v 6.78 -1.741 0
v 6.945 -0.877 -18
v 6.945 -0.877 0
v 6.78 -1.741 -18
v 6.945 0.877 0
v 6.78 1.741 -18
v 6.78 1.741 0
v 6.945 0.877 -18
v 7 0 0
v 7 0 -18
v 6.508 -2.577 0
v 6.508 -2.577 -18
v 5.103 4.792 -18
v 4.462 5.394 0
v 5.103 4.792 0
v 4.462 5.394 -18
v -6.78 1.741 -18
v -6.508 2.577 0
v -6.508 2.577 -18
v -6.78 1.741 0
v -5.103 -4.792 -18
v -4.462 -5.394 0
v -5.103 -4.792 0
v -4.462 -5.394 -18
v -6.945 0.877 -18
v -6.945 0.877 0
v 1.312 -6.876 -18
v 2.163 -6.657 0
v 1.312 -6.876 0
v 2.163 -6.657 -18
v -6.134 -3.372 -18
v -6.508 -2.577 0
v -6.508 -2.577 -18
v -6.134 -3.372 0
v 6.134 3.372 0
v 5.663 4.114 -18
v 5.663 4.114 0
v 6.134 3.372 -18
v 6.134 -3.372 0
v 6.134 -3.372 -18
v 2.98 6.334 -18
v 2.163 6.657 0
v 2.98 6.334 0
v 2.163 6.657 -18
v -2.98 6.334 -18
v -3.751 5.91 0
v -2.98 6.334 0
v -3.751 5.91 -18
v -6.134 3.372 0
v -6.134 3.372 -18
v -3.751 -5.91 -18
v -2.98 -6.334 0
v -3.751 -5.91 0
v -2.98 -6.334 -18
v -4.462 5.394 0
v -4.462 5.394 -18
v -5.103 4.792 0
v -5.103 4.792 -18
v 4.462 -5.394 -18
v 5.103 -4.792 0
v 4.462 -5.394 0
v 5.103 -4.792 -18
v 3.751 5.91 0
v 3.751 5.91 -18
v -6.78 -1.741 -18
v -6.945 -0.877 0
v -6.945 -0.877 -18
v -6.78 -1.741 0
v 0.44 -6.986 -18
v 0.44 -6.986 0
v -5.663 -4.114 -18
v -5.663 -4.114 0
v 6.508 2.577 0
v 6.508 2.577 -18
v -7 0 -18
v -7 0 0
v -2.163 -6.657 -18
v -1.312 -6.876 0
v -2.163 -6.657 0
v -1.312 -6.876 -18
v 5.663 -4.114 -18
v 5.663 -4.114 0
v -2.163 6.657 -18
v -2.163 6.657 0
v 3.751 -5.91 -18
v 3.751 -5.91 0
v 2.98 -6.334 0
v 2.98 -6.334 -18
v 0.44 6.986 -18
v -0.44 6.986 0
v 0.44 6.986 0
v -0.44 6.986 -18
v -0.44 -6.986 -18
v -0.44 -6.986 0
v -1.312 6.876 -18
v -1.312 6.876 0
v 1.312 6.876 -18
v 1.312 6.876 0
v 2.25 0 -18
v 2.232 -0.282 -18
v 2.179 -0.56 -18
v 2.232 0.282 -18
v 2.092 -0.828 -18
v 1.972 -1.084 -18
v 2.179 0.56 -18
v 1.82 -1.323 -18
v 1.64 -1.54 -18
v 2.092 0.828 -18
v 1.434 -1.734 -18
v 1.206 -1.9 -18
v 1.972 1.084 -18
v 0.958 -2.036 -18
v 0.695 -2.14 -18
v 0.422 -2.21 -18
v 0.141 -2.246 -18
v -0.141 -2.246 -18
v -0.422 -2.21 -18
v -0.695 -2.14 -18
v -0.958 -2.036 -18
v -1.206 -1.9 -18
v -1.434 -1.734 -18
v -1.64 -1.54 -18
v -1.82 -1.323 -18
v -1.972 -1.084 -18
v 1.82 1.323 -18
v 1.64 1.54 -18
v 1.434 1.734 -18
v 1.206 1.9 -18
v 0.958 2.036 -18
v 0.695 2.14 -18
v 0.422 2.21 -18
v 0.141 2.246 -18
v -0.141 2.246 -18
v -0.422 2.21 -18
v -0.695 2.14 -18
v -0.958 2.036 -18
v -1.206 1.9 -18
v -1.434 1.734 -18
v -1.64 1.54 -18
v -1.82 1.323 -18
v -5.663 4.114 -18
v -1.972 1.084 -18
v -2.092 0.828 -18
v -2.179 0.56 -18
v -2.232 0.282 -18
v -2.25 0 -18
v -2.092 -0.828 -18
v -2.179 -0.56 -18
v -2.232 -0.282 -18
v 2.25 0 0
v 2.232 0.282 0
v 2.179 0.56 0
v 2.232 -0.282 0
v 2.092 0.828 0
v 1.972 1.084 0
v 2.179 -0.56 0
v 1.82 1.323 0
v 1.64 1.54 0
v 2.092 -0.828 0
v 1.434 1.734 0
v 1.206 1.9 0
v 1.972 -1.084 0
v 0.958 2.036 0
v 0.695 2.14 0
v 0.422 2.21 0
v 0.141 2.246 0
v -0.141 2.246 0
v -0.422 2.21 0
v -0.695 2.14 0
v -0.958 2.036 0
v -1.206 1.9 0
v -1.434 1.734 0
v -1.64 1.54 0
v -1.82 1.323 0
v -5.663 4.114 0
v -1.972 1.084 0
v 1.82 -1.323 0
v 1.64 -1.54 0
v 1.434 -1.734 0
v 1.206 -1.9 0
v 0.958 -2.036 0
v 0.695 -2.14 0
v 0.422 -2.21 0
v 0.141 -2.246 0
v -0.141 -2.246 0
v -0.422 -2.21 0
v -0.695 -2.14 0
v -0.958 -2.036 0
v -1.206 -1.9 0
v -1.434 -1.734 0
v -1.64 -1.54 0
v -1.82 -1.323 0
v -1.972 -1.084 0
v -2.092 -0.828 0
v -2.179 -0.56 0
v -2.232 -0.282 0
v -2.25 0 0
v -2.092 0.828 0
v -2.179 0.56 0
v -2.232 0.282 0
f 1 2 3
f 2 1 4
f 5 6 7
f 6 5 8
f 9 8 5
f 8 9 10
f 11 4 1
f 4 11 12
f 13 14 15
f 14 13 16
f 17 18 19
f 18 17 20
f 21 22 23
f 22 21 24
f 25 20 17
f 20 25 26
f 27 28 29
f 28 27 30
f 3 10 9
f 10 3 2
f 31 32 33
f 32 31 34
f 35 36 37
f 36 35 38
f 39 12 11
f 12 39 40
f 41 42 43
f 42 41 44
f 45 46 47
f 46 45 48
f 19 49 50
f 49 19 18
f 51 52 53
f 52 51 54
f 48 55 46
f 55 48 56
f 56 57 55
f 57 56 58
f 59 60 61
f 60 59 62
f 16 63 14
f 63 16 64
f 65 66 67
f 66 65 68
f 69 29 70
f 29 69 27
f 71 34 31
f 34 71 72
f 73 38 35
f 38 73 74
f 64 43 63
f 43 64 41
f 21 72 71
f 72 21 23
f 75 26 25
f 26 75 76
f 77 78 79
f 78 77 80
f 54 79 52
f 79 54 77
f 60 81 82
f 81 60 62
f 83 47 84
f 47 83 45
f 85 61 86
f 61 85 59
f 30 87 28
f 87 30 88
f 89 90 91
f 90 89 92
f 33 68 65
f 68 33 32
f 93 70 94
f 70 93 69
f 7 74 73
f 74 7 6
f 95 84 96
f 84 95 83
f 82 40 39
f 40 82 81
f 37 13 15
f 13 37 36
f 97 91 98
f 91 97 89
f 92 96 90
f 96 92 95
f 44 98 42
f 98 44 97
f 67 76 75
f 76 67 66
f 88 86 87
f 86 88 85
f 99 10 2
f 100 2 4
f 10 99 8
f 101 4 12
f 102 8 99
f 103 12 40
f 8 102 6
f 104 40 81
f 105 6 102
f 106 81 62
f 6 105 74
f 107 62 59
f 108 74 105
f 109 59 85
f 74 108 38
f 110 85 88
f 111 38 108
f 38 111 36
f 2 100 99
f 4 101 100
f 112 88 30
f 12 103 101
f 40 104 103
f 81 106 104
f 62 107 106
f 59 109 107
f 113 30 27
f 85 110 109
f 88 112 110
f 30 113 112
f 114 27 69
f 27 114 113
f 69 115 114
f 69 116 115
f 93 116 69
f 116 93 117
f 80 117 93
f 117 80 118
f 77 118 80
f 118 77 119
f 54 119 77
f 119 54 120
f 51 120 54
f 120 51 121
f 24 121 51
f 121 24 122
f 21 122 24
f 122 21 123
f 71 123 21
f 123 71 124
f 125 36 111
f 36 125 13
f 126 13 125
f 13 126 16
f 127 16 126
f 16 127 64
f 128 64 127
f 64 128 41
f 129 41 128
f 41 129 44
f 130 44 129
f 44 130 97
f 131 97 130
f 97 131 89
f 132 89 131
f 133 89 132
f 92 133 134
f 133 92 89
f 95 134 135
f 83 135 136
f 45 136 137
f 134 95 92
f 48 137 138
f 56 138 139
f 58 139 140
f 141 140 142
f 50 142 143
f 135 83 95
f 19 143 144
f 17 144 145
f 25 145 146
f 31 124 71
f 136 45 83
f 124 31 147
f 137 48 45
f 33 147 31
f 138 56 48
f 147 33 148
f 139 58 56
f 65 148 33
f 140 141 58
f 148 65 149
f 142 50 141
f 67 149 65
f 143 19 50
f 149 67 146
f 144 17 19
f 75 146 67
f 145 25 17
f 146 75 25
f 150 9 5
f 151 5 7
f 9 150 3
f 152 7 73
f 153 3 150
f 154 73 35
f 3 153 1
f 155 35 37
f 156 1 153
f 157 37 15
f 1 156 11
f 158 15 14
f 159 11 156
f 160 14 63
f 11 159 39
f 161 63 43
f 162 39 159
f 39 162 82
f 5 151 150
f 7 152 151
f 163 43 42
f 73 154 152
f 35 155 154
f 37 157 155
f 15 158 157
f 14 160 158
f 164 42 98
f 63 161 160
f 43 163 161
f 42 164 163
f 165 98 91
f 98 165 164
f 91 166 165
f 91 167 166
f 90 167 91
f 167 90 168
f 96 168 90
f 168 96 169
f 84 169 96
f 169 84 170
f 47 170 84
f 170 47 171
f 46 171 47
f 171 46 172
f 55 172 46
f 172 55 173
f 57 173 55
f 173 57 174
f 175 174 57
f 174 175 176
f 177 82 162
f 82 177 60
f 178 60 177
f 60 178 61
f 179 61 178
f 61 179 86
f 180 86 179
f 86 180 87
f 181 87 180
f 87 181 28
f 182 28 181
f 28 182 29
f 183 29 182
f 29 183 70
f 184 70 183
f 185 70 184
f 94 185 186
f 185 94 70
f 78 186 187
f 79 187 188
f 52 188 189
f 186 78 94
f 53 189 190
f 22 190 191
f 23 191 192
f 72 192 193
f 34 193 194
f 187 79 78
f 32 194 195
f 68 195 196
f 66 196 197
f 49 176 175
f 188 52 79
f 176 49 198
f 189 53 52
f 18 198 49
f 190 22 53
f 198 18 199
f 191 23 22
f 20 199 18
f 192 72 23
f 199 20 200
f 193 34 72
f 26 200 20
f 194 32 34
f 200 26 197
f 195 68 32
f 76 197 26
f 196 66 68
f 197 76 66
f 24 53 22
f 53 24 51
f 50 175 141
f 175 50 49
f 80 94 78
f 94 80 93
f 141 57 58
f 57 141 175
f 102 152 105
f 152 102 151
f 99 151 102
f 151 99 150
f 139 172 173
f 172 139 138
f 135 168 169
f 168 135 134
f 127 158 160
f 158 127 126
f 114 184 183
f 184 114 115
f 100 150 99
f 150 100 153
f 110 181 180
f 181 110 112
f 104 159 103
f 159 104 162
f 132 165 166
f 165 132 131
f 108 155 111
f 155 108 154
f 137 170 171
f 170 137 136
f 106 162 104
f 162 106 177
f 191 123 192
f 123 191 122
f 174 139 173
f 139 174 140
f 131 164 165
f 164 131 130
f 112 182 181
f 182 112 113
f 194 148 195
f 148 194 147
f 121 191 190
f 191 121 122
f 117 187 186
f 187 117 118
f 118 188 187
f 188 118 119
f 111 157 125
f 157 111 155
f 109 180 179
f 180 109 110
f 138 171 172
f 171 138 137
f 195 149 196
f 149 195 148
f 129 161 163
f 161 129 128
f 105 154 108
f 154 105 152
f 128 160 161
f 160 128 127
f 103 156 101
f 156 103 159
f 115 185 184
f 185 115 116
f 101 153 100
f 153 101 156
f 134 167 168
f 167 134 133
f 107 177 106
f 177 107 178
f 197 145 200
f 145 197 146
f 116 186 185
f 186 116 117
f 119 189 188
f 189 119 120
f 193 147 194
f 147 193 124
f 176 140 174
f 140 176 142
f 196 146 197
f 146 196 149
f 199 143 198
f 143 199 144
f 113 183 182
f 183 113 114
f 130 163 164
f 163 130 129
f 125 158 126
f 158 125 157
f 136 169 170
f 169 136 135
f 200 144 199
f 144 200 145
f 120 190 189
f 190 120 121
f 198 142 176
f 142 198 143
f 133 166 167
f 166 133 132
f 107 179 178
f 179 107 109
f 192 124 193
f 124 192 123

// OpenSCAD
$fn = 50;


difference() {
	union() {
		translate(v = [0, 0, -18.0000000000]) {
			cylinder(h = 18, r = 7.0000000000);
		}
		cylinder(h = 0, r = 16.0000000000);
	}
	union() {
		#translate(v = [0, 0, -18]) {
			cylinder(h = 18, r = 2.2500000000);
		}
	}
}
